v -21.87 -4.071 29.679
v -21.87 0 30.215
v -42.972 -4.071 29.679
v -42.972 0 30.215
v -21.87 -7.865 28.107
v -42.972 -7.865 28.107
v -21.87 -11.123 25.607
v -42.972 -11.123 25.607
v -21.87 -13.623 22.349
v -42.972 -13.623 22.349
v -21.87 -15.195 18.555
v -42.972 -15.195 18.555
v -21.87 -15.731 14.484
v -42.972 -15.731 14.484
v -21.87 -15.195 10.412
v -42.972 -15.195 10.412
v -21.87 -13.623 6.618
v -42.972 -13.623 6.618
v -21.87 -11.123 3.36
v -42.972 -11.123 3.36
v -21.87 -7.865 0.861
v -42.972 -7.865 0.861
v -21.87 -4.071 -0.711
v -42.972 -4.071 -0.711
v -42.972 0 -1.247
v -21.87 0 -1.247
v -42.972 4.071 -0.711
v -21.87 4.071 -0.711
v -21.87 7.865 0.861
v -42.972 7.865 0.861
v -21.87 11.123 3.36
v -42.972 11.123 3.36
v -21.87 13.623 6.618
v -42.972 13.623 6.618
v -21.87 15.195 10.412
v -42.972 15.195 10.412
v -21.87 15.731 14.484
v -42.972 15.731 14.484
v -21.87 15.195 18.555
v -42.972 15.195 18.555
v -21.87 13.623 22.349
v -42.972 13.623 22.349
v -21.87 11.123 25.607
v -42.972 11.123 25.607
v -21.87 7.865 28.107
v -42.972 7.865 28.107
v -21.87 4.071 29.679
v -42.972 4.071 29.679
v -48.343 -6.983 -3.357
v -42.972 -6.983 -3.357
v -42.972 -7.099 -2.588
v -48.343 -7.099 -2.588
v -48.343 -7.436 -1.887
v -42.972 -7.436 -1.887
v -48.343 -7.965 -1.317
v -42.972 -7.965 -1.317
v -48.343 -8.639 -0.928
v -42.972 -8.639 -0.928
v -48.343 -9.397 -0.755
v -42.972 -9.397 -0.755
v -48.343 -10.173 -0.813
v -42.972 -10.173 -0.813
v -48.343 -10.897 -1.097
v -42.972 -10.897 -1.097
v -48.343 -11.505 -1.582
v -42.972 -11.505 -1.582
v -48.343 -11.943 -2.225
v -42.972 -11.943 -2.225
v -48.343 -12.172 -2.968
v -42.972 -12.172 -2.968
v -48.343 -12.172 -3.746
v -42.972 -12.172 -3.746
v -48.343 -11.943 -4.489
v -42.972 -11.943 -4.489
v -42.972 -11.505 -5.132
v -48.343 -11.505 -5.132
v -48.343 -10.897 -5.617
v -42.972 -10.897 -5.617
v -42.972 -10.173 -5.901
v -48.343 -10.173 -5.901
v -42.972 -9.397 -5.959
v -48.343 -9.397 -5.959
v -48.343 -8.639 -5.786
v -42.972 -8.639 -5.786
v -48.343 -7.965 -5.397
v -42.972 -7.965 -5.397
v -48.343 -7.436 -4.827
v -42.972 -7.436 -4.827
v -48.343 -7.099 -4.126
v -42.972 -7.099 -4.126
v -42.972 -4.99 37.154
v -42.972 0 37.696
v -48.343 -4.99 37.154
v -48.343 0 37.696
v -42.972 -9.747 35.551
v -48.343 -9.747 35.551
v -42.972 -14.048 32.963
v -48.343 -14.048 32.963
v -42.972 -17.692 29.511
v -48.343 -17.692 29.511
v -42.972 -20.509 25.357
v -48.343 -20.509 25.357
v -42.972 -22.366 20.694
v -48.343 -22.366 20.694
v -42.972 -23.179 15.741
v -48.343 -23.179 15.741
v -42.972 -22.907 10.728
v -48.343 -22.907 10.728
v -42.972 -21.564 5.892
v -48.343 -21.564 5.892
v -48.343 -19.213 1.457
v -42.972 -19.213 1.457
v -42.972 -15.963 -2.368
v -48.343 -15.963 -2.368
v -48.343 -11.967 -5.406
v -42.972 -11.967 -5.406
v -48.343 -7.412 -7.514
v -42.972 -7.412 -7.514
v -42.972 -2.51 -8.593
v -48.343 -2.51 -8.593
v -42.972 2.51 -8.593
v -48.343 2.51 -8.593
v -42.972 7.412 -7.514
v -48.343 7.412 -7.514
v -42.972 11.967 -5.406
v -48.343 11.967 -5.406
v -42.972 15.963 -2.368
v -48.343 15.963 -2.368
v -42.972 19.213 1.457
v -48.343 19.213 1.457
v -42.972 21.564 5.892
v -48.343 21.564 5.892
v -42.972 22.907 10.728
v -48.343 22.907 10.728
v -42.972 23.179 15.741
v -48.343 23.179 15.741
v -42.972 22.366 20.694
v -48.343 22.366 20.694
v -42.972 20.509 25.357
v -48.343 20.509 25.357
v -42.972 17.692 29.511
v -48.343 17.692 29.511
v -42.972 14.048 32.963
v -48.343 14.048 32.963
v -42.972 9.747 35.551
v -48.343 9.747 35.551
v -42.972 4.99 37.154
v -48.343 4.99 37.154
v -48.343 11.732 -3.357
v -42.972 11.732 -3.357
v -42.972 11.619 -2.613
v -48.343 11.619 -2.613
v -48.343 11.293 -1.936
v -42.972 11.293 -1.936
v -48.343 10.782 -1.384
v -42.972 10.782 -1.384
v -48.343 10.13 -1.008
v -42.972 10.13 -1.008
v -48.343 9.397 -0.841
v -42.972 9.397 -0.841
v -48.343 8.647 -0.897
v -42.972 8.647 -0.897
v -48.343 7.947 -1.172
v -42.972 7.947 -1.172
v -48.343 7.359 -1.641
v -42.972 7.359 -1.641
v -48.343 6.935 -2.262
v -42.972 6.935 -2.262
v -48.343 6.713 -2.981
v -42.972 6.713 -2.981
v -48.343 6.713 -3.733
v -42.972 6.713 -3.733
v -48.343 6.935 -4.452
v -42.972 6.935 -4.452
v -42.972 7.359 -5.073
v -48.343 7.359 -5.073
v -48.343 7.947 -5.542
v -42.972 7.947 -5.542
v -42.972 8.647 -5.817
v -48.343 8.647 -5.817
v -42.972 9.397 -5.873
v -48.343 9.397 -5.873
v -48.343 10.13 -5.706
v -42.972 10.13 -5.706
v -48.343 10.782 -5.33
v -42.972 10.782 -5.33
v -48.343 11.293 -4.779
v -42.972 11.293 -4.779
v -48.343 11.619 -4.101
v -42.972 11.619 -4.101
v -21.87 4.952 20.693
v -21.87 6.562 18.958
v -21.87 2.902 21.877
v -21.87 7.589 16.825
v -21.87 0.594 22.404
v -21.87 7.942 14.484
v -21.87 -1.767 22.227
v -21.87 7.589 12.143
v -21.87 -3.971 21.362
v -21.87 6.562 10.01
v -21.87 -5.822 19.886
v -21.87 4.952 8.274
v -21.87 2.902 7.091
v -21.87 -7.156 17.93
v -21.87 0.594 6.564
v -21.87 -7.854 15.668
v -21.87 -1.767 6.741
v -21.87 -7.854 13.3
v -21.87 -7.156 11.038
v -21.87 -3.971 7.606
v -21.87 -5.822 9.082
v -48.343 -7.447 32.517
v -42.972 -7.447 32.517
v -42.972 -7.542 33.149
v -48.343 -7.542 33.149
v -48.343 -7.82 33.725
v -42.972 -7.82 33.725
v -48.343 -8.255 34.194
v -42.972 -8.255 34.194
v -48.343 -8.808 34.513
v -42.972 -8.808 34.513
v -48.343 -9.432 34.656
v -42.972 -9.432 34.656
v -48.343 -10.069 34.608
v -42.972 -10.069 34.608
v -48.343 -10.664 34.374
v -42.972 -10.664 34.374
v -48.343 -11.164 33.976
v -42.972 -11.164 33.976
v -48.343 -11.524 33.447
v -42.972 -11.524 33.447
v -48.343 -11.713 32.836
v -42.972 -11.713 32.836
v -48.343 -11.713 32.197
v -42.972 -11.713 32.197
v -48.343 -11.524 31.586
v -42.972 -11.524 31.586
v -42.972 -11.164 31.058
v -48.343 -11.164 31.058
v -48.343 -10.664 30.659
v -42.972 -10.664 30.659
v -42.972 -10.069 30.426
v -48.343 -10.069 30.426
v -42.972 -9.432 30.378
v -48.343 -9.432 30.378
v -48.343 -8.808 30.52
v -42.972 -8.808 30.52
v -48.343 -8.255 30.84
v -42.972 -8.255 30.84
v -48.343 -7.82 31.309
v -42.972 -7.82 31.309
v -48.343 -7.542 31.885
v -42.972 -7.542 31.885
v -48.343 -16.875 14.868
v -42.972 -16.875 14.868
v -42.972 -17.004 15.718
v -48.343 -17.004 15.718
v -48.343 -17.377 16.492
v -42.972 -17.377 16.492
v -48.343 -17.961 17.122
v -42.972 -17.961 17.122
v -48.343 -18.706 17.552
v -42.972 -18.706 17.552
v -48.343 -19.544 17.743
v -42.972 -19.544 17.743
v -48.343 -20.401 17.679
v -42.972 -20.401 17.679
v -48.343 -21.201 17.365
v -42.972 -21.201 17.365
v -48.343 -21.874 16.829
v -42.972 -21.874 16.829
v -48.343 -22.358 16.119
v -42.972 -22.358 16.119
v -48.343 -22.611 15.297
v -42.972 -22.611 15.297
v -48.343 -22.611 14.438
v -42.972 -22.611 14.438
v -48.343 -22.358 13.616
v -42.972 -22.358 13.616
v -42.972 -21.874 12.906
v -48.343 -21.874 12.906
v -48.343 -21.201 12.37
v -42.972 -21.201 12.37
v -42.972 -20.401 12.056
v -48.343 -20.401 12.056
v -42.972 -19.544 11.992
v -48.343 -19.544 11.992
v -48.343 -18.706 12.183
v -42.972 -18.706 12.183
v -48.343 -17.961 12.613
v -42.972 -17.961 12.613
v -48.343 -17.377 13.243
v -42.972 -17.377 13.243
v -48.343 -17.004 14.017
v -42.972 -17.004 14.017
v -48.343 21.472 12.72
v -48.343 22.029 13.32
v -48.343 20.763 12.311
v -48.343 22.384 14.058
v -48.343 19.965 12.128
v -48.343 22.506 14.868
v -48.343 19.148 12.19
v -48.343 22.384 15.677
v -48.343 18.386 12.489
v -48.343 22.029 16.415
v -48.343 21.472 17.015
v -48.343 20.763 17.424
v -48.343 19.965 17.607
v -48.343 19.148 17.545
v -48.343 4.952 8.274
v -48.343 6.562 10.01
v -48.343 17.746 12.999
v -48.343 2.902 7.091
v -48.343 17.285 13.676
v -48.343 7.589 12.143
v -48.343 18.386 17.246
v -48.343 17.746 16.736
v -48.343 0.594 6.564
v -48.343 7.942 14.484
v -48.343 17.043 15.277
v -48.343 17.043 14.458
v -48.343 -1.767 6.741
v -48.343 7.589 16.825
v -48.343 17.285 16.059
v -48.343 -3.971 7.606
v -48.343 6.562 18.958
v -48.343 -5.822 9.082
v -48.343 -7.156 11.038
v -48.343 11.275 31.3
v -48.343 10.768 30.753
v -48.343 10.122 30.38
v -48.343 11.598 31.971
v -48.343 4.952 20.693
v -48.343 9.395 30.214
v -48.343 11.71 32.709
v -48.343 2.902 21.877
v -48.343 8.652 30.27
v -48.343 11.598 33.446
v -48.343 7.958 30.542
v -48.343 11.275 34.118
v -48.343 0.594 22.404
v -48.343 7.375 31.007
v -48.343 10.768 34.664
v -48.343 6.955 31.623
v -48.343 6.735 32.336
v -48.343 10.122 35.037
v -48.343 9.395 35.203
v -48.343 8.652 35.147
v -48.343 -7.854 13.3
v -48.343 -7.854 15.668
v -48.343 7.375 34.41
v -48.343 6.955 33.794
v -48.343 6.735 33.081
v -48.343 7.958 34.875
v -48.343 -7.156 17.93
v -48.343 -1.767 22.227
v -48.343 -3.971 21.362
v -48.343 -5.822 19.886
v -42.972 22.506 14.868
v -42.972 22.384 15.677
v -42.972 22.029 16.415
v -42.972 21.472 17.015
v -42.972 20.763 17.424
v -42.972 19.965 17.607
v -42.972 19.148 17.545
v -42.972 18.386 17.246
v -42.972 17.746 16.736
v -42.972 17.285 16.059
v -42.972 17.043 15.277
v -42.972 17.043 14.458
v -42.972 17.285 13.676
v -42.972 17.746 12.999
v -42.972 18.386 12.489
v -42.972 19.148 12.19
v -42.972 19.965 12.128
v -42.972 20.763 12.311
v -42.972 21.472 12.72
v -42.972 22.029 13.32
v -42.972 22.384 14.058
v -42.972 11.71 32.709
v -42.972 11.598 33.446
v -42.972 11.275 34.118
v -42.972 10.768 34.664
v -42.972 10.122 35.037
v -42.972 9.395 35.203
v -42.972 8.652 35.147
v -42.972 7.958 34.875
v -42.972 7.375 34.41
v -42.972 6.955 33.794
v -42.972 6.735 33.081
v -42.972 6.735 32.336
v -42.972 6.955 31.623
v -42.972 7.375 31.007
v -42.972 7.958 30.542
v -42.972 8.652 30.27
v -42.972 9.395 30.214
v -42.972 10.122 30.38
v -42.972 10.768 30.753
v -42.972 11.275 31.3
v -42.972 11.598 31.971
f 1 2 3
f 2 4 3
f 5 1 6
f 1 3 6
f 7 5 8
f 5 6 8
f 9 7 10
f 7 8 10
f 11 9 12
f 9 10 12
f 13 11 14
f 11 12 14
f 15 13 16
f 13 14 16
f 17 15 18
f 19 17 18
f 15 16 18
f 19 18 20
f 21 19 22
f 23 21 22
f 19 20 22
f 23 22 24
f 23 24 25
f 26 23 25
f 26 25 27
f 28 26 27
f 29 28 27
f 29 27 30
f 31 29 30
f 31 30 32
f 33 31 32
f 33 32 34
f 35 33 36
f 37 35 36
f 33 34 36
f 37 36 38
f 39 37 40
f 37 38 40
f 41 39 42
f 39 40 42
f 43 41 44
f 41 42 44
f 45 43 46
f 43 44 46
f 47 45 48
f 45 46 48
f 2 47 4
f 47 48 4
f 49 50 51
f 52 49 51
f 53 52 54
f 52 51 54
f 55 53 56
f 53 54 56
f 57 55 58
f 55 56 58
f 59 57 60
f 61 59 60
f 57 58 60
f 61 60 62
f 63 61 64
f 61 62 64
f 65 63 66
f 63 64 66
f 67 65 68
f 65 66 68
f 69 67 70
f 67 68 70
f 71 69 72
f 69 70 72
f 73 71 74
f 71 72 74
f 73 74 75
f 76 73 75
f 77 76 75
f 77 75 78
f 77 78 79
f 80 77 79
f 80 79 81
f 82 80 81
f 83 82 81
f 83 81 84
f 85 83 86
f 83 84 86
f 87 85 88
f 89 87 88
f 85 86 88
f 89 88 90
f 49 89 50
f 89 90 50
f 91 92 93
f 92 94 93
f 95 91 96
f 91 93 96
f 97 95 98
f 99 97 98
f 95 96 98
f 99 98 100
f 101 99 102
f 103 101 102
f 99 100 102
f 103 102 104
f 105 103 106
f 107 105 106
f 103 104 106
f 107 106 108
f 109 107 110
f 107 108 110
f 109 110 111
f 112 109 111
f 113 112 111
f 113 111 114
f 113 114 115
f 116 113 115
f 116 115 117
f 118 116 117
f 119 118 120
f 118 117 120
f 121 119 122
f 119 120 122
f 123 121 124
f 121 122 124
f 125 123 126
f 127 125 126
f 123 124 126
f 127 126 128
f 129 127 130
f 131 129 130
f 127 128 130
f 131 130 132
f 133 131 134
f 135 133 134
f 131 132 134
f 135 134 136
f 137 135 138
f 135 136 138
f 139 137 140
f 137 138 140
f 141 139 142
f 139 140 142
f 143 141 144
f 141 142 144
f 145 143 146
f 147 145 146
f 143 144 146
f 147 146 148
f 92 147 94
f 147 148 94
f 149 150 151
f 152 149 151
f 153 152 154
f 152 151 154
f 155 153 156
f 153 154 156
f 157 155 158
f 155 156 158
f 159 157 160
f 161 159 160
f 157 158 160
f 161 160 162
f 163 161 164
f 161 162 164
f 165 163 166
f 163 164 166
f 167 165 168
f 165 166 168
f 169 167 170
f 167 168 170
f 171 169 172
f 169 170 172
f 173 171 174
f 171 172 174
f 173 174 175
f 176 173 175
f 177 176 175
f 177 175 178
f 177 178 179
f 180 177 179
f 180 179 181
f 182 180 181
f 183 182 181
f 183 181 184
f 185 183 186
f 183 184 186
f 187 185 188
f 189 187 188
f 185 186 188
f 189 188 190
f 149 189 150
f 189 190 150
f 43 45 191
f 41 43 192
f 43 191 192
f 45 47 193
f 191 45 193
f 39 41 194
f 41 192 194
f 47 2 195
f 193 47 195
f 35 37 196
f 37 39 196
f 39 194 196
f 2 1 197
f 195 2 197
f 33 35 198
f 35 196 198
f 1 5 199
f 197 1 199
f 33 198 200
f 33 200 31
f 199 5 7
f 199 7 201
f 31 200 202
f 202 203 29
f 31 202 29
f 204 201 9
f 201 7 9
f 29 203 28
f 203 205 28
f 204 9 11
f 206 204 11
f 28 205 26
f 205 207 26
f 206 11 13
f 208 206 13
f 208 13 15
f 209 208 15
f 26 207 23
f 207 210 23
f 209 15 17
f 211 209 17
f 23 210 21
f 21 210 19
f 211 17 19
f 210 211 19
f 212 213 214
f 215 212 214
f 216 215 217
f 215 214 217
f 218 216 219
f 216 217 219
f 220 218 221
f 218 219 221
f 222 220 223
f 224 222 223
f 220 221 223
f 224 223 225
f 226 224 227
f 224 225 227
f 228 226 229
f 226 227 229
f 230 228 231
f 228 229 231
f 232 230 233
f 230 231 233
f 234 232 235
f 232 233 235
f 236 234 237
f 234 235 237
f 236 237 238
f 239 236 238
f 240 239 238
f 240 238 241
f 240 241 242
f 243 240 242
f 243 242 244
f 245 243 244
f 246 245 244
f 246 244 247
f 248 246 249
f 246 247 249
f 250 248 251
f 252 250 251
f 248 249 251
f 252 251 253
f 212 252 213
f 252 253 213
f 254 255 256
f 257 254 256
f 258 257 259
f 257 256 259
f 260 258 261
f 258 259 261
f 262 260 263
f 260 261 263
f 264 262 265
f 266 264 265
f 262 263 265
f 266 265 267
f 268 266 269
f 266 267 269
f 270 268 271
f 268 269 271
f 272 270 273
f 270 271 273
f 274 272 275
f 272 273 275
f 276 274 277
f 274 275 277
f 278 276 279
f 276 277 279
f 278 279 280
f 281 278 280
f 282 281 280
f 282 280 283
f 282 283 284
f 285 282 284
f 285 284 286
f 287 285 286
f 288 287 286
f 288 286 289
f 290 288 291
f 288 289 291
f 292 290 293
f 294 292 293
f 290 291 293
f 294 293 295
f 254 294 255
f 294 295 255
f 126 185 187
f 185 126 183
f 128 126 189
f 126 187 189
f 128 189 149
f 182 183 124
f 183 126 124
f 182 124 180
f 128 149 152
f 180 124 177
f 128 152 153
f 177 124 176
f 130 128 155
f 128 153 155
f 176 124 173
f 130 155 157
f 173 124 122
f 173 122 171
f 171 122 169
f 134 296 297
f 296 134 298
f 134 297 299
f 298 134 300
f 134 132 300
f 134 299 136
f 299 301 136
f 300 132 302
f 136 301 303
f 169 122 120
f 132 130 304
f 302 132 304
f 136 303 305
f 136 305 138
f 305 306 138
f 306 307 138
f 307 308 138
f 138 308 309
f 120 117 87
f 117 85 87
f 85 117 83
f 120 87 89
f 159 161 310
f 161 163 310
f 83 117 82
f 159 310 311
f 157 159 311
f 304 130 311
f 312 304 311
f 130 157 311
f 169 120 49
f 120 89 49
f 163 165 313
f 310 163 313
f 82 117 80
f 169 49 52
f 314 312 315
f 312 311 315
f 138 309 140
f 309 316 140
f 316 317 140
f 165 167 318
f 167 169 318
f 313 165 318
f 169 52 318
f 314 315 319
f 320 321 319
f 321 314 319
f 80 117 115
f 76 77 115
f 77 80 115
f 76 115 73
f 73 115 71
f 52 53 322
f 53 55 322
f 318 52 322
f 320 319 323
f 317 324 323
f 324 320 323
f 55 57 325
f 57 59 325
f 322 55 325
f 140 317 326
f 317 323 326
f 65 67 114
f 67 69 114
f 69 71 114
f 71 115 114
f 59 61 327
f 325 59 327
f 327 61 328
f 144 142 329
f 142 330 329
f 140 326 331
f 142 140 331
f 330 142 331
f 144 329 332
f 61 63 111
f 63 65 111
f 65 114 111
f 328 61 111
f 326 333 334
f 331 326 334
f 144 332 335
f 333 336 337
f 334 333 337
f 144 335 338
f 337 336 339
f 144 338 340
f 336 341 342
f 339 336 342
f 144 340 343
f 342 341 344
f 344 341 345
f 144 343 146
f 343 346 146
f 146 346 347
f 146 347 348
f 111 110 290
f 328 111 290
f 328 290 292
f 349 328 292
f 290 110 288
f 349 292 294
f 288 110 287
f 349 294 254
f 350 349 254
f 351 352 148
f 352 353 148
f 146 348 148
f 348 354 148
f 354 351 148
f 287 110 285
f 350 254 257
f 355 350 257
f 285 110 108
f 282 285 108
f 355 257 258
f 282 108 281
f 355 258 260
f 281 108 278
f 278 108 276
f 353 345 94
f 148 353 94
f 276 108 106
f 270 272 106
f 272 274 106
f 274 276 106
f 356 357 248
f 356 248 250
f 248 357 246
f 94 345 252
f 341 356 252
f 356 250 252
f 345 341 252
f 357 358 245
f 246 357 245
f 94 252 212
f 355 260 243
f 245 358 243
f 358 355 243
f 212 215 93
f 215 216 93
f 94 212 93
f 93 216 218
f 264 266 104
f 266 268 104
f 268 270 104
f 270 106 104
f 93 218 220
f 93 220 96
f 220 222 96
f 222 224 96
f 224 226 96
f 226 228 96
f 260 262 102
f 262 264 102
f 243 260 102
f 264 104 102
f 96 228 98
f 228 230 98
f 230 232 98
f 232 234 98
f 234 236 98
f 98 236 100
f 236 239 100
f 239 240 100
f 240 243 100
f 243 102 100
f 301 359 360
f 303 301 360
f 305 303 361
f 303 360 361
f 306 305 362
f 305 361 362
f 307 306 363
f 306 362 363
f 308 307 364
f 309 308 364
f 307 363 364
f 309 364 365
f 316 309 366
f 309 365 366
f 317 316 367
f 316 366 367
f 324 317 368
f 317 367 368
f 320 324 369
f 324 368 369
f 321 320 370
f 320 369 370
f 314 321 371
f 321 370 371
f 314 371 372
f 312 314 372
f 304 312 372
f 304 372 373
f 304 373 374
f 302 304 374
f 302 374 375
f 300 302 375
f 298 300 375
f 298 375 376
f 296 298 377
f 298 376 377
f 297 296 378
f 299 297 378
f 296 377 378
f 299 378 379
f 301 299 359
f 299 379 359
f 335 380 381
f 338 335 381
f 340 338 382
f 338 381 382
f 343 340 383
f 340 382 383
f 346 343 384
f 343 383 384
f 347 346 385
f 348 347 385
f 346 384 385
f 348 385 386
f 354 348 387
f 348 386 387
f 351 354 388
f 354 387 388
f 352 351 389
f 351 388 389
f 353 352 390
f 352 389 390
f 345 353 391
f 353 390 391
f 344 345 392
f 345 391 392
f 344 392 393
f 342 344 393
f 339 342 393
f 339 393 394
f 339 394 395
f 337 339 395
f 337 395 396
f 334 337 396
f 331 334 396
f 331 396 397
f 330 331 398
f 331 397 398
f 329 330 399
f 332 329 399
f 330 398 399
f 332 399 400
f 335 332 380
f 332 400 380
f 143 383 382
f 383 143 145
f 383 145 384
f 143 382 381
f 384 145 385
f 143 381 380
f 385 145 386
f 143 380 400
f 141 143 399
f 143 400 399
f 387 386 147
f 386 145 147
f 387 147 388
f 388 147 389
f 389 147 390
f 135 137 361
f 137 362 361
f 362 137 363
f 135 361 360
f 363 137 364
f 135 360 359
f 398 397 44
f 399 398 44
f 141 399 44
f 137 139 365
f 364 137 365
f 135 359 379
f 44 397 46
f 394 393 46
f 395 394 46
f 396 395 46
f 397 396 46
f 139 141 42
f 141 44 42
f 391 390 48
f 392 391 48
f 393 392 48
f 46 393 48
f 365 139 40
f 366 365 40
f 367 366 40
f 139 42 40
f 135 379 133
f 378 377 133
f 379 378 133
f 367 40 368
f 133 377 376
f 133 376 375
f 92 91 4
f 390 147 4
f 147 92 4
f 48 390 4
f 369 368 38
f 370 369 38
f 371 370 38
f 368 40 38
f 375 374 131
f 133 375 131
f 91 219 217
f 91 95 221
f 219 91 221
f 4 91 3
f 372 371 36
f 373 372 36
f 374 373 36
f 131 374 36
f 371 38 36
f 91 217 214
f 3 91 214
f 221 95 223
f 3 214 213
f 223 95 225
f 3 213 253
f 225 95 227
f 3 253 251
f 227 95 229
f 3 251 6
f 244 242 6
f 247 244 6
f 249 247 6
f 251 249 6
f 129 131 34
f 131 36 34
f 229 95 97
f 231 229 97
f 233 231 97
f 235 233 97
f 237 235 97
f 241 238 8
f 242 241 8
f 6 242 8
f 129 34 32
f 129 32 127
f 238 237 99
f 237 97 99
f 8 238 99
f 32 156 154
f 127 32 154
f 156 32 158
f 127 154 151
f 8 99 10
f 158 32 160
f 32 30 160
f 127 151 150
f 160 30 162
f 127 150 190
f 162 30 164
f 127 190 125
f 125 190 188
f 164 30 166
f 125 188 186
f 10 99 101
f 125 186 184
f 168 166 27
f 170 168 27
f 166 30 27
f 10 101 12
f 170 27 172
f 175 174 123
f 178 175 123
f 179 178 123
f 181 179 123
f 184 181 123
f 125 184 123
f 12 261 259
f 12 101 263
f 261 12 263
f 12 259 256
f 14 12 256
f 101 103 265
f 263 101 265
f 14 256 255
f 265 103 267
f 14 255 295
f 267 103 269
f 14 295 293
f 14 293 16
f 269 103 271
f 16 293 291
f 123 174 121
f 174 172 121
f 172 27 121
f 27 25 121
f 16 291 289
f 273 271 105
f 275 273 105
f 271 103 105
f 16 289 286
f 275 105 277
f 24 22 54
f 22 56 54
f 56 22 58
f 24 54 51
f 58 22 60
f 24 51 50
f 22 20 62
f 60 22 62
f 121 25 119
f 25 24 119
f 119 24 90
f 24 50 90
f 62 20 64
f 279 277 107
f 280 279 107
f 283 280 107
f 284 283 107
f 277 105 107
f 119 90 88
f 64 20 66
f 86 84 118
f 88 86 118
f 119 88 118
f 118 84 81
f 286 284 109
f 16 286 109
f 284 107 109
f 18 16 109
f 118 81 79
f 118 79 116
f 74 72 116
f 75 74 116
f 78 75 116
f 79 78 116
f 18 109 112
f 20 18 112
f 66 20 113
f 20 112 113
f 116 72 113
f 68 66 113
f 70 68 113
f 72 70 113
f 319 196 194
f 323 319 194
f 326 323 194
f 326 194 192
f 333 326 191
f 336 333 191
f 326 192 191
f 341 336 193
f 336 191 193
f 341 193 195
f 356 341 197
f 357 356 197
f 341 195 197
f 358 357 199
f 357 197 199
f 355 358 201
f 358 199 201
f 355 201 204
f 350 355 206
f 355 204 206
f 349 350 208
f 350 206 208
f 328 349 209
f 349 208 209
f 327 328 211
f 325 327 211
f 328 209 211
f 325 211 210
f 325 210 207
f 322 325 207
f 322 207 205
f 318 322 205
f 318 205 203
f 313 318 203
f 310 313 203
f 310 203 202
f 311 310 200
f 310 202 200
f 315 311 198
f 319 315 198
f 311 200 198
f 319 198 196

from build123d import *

# Parameters (mm, degrees)
F0_W     = 26.4738108963
F0_H     = 8.0572450534
F2_R     = 7.9422363179
F3_DEPTH = 26.4738108963
F5_R     = 2.1448281624
F5_R_2   = 2.5012779103
F5_R_3   = 2.6092964081
F5_R_4   = 2.5232516324
F5_R_5   = 2.8839759477
F5_R_6   = 2.7467200302
F6_DEPTH = 5.3714960814


with BuildPart() as f1:
    # F0 (on Front) → F1 (revolve)
    with BuildSketch(Plane.XZ):
        Polygon((-48.3434833586, 37.6964099705), (-48.3434833586, 22.5411076099), (-21.8696724623, 22.5411076099), (-21.8696724623, 30.2146784961), (-42.9719872773, 30.2146784961), (-42.9719872773, 37.6964099705), align=None)
        with Locations((-35.1065779105, 18.5124850832)):
            Rectangle(F0_W, F0_H)
    revolve(axis=Axis((-35.1065779105, 0, 14.4838625565), (1, 0, 0)))

    # F2 (on face) → F3 (cut, through all)
    with BuildSketch(Plane.YZ.offset(-21.8696724623)):
        with Locations((0, 14.4838625565)):
            Circle(F2_R)
    extrude(amount=-F3_DEPTH, mode=Mode.SUBTRACT)

    # F5 (on face) → F6 (cut, through all)
    with BuildSketch(Plane.YZ.offset(-42.9719872773)):
        with Locations((-9.5919603482, 32.5167477131)):
            Circle(F5_R)
        with Locations((9.2082852498, 32.7085889876)):
            Circle(F5_R_2)
        with Locations((-9.5919603482, -3.3571864478)):
            Circle(F5_R_3)
        with Locations((9.2082852498, -3.3571864478)):
            Circle(F5_R_4)
        with Locations((-19.7594407946, 14.8675395176)):
            Circle(F5_R_5)
        with Locations((19.7594407946, 14.8675395176)):
            Circle(F5_R_6)
    extrude(amount=-F6_DEPTH, mode=Mode.SUBTRACT)


solid = f1.part
